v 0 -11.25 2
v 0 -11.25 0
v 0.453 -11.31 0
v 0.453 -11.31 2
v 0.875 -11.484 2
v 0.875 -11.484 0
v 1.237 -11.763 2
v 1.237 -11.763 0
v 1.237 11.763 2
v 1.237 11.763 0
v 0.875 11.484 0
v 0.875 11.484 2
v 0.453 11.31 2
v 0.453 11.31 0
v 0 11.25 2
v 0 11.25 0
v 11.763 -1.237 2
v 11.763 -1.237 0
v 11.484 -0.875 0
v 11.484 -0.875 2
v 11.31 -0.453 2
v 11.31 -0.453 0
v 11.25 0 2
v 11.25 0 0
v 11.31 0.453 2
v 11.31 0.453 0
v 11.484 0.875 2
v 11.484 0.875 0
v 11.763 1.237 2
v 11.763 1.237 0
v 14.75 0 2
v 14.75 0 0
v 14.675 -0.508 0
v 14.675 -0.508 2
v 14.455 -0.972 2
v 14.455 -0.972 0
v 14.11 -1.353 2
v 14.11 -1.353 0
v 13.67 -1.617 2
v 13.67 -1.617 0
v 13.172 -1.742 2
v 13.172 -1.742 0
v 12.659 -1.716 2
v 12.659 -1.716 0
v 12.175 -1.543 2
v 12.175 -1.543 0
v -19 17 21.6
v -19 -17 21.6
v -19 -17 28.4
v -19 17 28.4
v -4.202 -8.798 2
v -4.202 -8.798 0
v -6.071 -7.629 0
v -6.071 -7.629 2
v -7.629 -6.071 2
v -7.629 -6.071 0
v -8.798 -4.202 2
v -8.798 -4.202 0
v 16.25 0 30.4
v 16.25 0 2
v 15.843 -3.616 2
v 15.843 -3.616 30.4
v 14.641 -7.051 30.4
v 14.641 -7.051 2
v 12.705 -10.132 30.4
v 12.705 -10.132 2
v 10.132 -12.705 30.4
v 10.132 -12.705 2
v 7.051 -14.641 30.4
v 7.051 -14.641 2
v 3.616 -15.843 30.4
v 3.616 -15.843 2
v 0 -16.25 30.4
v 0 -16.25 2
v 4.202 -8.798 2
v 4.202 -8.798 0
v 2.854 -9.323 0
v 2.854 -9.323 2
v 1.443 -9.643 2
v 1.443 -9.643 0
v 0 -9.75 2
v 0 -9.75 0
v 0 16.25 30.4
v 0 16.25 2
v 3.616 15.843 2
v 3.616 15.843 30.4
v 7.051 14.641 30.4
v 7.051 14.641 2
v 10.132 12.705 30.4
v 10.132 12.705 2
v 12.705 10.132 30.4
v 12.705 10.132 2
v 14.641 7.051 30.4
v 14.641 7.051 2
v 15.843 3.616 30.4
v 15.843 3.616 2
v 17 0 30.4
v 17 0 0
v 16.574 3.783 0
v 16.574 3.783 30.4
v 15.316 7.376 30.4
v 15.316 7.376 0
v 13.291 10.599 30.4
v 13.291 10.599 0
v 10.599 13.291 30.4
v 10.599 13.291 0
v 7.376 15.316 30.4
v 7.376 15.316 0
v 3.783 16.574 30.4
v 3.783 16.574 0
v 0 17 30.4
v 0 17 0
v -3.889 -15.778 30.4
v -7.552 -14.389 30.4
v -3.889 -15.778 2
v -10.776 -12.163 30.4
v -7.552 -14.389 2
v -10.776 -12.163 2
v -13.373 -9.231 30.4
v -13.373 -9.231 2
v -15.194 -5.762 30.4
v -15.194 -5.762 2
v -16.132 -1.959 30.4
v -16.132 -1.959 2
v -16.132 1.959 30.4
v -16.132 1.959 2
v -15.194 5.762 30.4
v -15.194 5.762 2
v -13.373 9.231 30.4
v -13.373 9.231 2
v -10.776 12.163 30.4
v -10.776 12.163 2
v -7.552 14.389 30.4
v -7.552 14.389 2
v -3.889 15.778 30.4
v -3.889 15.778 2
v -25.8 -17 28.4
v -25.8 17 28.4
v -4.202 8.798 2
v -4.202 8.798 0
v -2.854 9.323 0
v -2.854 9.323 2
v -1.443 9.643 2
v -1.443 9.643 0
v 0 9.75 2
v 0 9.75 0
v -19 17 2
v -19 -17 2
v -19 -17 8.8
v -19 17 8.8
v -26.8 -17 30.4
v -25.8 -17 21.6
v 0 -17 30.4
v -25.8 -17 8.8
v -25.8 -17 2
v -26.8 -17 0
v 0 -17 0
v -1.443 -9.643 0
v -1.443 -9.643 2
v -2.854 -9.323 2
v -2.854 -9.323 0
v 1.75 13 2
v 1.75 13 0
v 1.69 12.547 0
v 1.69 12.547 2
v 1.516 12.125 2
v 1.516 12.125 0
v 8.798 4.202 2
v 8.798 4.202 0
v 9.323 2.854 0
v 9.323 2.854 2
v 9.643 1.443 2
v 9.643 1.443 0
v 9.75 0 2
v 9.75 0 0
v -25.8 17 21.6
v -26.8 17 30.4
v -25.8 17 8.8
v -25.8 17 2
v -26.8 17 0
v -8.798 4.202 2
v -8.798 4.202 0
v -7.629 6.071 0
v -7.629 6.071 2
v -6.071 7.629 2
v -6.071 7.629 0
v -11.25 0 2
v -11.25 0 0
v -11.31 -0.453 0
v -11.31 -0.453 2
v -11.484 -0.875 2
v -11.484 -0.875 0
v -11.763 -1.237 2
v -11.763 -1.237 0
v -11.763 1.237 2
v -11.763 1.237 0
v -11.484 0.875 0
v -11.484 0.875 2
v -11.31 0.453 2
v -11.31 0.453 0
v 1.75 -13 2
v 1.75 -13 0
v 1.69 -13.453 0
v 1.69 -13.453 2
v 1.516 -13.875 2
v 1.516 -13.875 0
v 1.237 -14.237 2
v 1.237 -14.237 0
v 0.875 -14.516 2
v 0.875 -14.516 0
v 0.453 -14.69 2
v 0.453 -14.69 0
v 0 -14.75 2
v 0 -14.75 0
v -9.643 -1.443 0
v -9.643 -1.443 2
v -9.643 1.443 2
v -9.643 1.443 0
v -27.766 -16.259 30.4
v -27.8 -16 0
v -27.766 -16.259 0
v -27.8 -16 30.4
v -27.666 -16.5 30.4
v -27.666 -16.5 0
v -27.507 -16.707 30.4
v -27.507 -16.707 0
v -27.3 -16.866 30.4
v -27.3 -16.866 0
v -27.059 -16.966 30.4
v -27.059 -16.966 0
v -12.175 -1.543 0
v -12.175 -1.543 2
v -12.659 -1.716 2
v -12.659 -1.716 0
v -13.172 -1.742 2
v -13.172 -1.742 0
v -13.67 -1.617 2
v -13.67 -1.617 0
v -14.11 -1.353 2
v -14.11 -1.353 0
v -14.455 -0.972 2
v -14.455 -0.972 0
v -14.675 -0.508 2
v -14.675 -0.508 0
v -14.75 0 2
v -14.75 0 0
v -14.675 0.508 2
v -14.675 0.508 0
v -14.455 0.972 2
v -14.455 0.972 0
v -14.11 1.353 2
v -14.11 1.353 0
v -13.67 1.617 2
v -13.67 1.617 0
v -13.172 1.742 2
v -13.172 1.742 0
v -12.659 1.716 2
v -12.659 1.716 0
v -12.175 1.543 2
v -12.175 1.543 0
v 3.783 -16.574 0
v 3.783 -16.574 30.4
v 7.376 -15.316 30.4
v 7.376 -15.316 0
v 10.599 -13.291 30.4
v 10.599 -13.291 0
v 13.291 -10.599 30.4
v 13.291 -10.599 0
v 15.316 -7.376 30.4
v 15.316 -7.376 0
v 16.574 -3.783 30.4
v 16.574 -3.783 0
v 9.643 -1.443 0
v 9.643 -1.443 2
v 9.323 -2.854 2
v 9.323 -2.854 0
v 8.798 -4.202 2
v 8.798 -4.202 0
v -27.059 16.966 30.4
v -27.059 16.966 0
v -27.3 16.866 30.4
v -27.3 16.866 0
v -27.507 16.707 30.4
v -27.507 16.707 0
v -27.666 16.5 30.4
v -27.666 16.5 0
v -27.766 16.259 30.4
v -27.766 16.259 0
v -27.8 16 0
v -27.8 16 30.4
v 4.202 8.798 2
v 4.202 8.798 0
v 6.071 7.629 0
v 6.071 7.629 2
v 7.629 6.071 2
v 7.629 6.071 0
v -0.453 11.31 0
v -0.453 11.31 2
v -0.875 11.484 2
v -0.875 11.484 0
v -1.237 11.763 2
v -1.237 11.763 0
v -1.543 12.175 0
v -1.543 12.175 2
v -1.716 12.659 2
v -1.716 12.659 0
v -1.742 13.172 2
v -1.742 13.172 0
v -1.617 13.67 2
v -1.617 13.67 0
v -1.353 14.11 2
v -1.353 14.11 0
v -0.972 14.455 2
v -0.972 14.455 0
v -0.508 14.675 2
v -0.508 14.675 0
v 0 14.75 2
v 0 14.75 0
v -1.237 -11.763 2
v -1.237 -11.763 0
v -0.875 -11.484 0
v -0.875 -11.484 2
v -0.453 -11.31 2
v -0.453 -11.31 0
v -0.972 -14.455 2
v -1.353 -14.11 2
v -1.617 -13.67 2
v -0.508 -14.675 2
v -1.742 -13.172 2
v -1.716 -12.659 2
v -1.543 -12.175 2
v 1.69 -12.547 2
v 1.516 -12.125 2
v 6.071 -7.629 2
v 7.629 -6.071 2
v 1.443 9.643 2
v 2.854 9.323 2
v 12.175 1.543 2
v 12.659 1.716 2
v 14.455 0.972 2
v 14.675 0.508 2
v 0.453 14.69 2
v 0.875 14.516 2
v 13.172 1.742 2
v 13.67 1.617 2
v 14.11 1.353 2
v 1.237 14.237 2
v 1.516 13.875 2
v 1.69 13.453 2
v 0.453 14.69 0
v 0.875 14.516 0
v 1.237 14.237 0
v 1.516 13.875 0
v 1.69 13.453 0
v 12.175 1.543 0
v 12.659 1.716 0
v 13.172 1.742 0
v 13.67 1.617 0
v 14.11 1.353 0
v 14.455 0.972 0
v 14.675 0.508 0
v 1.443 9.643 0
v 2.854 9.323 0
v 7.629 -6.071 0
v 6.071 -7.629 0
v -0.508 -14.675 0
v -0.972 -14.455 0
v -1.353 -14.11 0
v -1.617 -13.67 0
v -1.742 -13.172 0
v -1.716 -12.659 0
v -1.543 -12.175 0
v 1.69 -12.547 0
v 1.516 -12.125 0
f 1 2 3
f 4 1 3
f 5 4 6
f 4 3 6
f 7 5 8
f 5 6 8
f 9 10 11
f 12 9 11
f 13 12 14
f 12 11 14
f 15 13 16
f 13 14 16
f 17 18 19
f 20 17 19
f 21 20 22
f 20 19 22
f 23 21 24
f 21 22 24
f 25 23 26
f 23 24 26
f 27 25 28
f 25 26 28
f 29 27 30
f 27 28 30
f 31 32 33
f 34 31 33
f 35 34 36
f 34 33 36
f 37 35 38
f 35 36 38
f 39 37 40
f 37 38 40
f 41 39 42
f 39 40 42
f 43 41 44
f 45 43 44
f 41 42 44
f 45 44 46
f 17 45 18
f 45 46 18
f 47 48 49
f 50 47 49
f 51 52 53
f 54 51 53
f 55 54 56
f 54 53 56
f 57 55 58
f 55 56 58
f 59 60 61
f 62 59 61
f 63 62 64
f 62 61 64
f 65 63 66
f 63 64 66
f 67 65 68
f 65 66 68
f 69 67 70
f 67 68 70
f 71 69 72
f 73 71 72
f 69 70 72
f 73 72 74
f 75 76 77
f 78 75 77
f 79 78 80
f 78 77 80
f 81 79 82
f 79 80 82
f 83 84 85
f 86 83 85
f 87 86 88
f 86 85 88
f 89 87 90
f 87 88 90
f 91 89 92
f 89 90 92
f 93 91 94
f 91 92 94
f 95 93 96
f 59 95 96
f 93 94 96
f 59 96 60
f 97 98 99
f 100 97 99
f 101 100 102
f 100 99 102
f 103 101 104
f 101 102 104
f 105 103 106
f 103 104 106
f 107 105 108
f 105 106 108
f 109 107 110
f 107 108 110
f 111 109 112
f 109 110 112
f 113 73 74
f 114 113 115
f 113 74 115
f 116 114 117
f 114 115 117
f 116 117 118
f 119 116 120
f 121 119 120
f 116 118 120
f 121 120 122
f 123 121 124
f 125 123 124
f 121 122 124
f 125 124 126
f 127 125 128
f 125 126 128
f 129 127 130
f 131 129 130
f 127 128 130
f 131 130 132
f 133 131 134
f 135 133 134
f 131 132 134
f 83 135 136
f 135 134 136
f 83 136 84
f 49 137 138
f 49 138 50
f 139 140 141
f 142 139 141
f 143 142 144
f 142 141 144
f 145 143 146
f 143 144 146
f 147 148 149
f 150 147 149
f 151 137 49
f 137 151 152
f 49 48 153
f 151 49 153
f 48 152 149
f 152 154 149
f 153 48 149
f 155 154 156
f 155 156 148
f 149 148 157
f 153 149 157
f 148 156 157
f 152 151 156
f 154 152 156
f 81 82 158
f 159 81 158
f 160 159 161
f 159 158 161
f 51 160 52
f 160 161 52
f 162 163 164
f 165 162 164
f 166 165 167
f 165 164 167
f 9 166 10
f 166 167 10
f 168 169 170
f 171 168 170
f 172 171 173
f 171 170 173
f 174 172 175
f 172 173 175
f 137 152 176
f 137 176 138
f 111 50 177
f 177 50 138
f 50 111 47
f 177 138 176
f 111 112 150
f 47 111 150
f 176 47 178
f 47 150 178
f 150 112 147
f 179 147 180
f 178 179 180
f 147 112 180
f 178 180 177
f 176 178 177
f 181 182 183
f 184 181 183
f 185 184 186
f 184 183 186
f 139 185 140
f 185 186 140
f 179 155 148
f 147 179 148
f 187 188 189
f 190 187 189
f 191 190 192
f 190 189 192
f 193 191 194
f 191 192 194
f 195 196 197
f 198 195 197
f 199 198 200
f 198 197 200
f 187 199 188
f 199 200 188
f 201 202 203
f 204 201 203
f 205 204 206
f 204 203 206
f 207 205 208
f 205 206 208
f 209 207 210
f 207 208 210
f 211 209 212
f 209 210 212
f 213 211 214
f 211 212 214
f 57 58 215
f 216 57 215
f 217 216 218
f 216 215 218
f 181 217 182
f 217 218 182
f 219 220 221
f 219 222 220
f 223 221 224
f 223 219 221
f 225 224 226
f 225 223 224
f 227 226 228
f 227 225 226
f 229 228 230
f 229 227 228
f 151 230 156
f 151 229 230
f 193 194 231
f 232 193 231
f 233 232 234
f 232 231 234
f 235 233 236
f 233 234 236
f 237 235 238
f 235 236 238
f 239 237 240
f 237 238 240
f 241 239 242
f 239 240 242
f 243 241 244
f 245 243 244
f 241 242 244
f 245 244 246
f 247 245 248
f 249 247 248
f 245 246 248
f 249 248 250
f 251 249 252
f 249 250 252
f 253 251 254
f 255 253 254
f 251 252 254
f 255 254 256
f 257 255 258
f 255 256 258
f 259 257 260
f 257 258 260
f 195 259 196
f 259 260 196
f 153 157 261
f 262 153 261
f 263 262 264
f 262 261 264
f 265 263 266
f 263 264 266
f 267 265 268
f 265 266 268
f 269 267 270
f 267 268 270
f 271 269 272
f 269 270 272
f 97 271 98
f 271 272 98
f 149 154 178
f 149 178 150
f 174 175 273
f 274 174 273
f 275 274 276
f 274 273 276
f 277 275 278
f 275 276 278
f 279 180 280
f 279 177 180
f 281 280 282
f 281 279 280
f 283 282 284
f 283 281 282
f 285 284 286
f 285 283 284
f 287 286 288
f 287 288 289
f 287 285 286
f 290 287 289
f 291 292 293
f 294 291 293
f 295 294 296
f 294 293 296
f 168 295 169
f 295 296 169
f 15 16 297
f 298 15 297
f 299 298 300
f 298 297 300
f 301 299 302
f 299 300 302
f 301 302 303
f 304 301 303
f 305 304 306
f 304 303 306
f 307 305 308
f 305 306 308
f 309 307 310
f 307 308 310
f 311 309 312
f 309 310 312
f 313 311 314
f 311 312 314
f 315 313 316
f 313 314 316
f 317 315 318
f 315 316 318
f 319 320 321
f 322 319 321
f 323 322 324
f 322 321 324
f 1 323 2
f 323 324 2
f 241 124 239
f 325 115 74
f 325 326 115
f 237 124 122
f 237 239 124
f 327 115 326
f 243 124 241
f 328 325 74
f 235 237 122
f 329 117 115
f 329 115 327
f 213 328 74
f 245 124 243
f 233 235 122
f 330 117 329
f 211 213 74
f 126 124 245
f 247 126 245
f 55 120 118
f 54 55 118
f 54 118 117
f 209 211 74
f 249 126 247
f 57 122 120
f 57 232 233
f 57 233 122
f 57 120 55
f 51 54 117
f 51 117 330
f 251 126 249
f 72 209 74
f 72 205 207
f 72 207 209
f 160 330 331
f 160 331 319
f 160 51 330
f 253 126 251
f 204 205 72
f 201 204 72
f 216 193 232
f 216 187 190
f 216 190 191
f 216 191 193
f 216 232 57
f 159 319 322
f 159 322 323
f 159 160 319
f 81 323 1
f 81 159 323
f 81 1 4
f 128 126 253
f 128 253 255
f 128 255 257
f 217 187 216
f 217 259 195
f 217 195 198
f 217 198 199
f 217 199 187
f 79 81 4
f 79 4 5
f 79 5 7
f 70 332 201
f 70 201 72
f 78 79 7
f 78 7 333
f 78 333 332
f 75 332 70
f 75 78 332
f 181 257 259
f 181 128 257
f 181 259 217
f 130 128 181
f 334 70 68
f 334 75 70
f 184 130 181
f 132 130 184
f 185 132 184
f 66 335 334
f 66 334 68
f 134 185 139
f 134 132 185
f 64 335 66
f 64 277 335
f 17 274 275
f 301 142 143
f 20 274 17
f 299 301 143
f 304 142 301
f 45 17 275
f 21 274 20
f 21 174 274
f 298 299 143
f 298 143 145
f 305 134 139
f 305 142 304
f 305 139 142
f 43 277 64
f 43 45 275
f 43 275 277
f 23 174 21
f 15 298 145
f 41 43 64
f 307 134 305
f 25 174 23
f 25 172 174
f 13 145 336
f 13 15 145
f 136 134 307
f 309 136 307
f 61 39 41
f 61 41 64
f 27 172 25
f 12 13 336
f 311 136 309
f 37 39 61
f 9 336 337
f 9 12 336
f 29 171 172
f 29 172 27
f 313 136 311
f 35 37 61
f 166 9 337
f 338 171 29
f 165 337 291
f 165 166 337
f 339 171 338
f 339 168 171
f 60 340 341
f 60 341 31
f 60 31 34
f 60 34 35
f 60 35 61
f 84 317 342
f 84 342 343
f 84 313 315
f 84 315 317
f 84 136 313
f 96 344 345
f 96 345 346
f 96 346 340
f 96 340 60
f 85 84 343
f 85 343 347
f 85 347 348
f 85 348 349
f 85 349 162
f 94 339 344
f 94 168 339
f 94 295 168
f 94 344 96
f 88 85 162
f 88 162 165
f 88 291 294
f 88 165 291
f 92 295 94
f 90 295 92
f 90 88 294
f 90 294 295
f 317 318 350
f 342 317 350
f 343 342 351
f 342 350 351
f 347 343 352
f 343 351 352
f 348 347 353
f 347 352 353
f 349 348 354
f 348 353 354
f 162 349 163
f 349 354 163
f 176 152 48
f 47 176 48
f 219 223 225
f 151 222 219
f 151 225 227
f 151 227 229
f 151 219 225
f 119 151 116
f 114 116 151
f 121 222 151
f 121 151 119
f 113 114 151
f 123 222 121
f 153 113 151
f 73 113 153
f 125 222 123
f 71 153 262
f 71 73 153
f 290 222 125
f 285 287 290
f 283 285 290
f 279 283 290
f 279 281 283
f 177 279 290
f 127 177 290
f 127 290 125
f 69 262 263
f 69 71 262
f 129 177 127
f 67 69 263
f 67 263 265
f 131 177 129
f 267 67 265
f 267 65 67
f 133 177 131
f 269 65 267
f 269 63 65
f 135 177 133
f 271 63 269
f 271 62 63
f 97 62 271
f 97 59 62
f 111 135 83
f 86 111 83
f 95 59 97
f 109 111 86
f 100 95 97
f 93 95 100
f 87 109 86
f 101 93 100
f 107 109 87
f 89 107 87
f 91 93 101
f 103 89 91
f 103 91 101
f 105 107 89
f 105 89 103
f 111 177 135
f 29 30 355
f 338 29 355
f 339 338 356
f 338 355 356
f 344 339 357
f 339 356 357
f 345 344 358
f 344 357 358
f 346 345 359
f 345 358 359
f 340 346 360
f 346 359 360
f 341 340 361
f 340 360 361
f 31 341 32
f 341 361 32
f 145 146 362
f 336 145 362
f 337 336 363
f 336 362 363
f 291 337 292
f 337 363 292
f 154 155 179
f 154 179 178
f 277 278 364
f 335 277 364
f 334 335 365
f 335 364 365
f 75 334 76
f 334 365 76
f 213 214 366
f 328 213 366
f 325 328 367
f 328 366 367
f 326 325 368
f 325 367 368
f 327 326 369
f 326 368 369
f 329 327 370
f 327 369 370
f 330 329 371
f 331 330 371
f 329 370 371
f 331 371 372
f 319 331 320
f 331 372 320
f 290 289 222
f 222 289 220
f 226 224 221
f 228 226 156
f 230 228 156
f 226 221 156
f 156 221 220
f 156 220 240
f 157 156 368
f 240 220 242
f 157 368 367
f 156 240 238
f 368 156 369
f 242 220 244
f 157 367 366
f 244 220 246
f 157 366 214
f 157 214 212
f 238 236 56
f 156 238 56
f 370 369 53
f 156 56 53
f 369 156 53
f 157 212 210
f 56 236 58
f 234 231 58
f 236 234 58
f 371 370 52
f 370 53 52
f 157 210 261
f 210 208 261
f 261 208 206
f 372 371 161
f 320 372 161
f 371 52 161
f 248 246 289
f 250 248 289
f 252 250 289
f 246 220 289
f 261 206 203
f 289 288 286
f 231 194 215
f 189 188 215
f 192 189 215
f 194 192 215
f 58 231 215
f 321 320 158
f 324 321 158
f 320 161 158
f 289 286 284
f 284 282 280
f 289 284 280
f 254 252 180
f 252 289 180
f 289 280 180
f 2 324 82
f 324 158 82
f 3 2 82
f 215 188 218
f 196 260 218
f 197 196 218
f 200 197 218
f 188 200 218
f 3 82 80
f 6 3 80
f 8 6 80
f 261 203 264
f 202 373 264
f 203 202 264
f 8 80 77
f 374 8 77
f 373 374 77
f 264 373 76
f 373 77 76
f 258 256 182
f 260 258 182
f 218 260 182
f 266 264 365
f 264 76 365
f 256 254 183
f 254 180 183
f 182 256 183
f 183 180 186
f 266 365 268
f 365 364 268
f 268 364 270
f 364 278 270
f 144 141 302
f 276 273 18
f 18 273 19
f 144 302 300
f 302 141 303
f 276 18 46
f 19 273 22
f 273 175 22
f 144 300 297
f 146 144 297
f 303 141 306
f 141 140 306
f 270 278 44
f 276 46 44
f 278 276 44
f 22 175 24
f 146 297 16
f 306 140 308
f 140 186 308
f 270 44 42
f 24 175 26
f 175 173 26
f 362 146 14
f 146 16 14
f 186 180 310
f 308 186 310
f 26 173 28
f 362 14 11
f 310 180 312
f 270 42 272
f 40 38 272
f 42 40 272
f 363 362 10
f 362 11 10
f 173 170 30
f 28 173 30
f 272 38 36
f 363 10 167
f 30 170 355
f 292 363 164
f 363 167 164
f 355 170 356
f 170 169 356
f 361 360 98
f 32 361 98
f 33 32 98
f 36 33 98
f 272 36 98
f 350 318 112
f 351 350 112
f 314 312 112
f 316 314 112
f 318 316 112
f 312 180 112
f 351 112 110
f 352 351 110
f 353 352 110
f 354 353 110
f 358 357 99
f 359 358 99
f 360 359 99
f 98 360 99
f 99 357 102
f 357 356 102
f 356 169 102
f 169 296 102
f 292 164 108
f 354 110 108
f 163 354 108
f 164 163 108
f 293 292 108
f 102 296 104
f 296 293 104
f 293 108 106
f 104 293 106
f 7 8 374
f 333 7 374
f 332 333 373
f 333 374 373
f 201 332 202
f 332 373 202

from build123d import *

# Parameters (mm, degrees)
F1_DEPTH = 30.4
F2_DEPTH = 2
F3_W     = 6.8
F3_H     = 6.8
F4_DEPTH = 50
F5_R     = 1


with BuildPart() as f1:
    # F0 (on Top) → F1 (new body)
    with BuildSketch(Plane.XY):
        with BuildLine():
            ThreePointArc((0, -17), (-17, 0), (0, 17))
            Line((0, 17), (-27.8, 17))
            Line((-27.8, 17), (-27.8, -17))
            Line((-27.8, -17), (0, -17))
        make_face()
        with BuildLine():
            ThreePointArc((0, -16.25), (-16.25, 0), (0, 16.25))
            Line((0, 16.25), (0, 17))
            ThreePointArc((0, 17), (-17, 0), (0, -17))
            Line((0, -17), (0, -16.25))
        make_face()
        with BuildLine():
            ThreePointArc((0, 16.25), (11.4904851943, 11.4904851943), (16.25, 0))
            ThreePointArc((16.25, 0), (11.4904851943, -11.4904851943), (0, -16.25))
            Line((0, -16.25), (0, -17))
            ThreePointArc((0, -17), (12.0208152802, -12.0208152802), (17, 0))
            ThreePointArc((17, 0), (12.0208152802, 12.0208152802), (0, 17))
            Line((0, 17), (0, 16.25))
        make_face()
    extrude(amount=F1_DEPTH)

    # F0 (on Top) → F2 (join)
    with BuildSketch(Plane.XY):
        with BuildLine():
            ThreePointArc((0, -16.25), (11.4904851943, -11.4904851943), (16.25, 0))
            ThreePointArc((16.25, 0), (11.4904851943, 11.4904851943), (0, 16.25))
            Line((0, 16.25), (0, 14.75))
            ThreePointArc((0, 14.75), (1.2374368671, 14.2374368671), (1.75, 13))
            ThreePointArc((1.75, 13), (1.6167891819, 12.3303039934), (1.2374368671, 11.7625631329))
            Line((1.2374368671, 11.7625631329), (4.2019029611, 8.7980970389))
            ThreePointArc((4.2019029611, 8.7980970389), (6.8942911166, 6.8942911166), (8.7980970389, 4.2019029611))
            Line((8.7980970389, 4.2019029611), (11.7625631329, 1.2374368671))
            ThreePointArc((11.7625631329, 1.2374368671), (13.6696960066, 1.6167891819), (14.75, 0))
            ThreePointArc((14.75, 0), (13.6696960066, -1.6167891819), (11.7625631329, -1.2374368671))
            Line((11.7625631329, -1.2374368671), (8.7980970389, -4.2019029611))
            ThreePointArc((8.7980970389, -4.2019029611), (6.8942911166, -6.8942911166), (4.2019029611, -8.7980970389))
            Line((4.2019029611, -8.7980970389), (1.2374368671, -11.7625631329))
            ThreePointArc((1.2374368671, -11.7625631329), (1.6167891819, -12.3303039934), (1.75, -13))
            ThreePointArc((1.75, -13), (1.2374368671, -14.2374368671), (0, -14.75))
            Line((0, -14.75), (0, -16.25))
        make_face()
        with BuildLine():
            Line((0, 14.75), (0, 16.25))
            ThreePointArc((0, 16.25), (-16.25, 0), (0, -16.25))
            Line((0, -16.25), (0, -14.75))
            ThreePointArc((0, -14.75), (-1.6167891819, -13.6696960066), (-1.2374368671, -11.7625631329))
            Line((-1.2374368671, -11.7625631329), (-4.2019029611, -8.7980970389))
            ThreePointArc((-4.2019029611, -8.7980970389), (-6.8942911166, -6.8942911166), (-8.7980970389, -4.2019029611))
            Line((-8.7980970389, -4.2019029611), (-11.7625631329, -1.2374368671))
            ThreePointArc((-11.7625631329, -1.2374368671), (-14.75, 0), (-11.7625631329, 1.2374368671))
            Line((-11.7625631329, 1.2374368671), (-8.7980970389, 4.2019029611))
            ThreePointArc((-8.7980970389, 4.2019029611), (-6.8942911166, 6.8942911166), (-4.2019029611, 8.7980970389))
            Line((-4.2019029611, 8.7980970389), (-1.2374368671, 11.7625631329))
            ThreePointArc((-1.2374368671, 11.7625631329), (-1.6167891819, 13.6696960066), (0, 14.75))
        make_face()
        with BuildLine():
            ThreePointArc((1.2374368671, 11.7625631329), (0.6696960066, 11.3832108181), (0, 11.25))
            Line((0, 11.25), (0, 9.75))
            ThreePointArc((0, 9.75), (2.1541882312, 9.5090469062), (4.2019029611, 8.7980970389))
            Line((4.2019029611, 8.7980970389), (1.2374368671, 11.7625631329))
        make_face()
        with BuildLine():
            ThreePointArc((0, 11.25), (-0.6696960066, 11.3832108181), (-1.2374368671, 11.7625631329))
            Line((-1.2374368671, 11.7625631329), (-4.2019029611, 8.7980970389))
            ThreePointArc((-4.2019029611, 8.7980970389), (-2.1541882312, 9.5090469062), (0, 9.75))
            Line((0, 9.75), (0, 11.25))
        make_face()
        with BuildLine():
            ThreePointArc((-8.7980970389, -4.2019029611), (-9.75, 0), (-8.7980970389, 4.2019029611))
            Line((-8.7980970389, 4.2019029611), (-11.7625631329, 1.2374368671))
            ThreePointArc((-11.7625631329, 1.2374368671), (-11.3832108181, 0.6696960066), (-11.25, 0))
            ThreePointArc((-11.25, 0), (-11.3832108181, -0.6696960066), (-11.7625631329, -1.2374368671))
            Line((-11.7625631329, -1.2374368671), (-8.7980970389, -4.2019029611))
        make_face()
        with BuildLine():
            Line((11.7625631329, 1.2374368671), (8.7980970389, 4.2019029611))
            ThreePointArc((8.7980970389, 4.2019029611), (9.5090469062, 2.1541882312), (9.75, 0))
            ThreePointArc((9.75, 0), (9.5090469062, -2.1541882312), (8.7980970389, -4.2019029611))
            Line((8.7980970389, -4.2019029611), (11.7625631329, -1.2374368671))
            ThreePointArc((11.7625631329, -1.2374368671), (11.25, 0), (11.7625631329, 1.2374368671))
        make_face()
        with BuildLine():
            Line((0, -9.75), (0, -11.25))
            ThreePointArc((0, -11.25), (0.6696960066, -11.3832108181), (1.2374368671, -11.7625631329))
            Line((1.2374368671, -11.7625631329), (4.2019029611, -8.7980970389))
            ThreePointArc((4.2019029611, -8.7980970389), (2.1541882312, -9.5090469062), (0, -9.75))
        make_face()
        with BuildLine():
            Line((-4.2019029611, -8.7980970389), (-1.2374368671, -11.7625631329))
            ThreePointArc((-1.2374368671, -11.7625631329), (-0.6696960066, -11.3832108181), (0, -11.25))
            Line((0, -11.25), (0, -9.75))
            ThreePointArc((0, -9.75), (-2.1541882312, -9.5090469062), (-4.2019029611, -8.7980970389))
        make_face()
    extrude(amount=F2_DEPTH)

    # F3 (on face) → F4 (cut)
    with BuildSketch(Plane.XZ.offset(17)):
        with Locations((-22.4, 25)):
            Rectangle(F3_W, F3_H)
        with Locations((-22.4, 5.4)):
            Rectangle(F3_W, F3_H)
    extrude(amount=-F4_DEPTH, mode=Mode.SUBTRACT)

    # F5
    f5_edges = [f1.edges().sort_by_distance(p)[0] for p in [
        (-27.8, 17, 15.2),
        (-27.8, -17, 15.2),
    ]]
    fillet(f5_edges, radius=F5_R)


solid = f1.part
